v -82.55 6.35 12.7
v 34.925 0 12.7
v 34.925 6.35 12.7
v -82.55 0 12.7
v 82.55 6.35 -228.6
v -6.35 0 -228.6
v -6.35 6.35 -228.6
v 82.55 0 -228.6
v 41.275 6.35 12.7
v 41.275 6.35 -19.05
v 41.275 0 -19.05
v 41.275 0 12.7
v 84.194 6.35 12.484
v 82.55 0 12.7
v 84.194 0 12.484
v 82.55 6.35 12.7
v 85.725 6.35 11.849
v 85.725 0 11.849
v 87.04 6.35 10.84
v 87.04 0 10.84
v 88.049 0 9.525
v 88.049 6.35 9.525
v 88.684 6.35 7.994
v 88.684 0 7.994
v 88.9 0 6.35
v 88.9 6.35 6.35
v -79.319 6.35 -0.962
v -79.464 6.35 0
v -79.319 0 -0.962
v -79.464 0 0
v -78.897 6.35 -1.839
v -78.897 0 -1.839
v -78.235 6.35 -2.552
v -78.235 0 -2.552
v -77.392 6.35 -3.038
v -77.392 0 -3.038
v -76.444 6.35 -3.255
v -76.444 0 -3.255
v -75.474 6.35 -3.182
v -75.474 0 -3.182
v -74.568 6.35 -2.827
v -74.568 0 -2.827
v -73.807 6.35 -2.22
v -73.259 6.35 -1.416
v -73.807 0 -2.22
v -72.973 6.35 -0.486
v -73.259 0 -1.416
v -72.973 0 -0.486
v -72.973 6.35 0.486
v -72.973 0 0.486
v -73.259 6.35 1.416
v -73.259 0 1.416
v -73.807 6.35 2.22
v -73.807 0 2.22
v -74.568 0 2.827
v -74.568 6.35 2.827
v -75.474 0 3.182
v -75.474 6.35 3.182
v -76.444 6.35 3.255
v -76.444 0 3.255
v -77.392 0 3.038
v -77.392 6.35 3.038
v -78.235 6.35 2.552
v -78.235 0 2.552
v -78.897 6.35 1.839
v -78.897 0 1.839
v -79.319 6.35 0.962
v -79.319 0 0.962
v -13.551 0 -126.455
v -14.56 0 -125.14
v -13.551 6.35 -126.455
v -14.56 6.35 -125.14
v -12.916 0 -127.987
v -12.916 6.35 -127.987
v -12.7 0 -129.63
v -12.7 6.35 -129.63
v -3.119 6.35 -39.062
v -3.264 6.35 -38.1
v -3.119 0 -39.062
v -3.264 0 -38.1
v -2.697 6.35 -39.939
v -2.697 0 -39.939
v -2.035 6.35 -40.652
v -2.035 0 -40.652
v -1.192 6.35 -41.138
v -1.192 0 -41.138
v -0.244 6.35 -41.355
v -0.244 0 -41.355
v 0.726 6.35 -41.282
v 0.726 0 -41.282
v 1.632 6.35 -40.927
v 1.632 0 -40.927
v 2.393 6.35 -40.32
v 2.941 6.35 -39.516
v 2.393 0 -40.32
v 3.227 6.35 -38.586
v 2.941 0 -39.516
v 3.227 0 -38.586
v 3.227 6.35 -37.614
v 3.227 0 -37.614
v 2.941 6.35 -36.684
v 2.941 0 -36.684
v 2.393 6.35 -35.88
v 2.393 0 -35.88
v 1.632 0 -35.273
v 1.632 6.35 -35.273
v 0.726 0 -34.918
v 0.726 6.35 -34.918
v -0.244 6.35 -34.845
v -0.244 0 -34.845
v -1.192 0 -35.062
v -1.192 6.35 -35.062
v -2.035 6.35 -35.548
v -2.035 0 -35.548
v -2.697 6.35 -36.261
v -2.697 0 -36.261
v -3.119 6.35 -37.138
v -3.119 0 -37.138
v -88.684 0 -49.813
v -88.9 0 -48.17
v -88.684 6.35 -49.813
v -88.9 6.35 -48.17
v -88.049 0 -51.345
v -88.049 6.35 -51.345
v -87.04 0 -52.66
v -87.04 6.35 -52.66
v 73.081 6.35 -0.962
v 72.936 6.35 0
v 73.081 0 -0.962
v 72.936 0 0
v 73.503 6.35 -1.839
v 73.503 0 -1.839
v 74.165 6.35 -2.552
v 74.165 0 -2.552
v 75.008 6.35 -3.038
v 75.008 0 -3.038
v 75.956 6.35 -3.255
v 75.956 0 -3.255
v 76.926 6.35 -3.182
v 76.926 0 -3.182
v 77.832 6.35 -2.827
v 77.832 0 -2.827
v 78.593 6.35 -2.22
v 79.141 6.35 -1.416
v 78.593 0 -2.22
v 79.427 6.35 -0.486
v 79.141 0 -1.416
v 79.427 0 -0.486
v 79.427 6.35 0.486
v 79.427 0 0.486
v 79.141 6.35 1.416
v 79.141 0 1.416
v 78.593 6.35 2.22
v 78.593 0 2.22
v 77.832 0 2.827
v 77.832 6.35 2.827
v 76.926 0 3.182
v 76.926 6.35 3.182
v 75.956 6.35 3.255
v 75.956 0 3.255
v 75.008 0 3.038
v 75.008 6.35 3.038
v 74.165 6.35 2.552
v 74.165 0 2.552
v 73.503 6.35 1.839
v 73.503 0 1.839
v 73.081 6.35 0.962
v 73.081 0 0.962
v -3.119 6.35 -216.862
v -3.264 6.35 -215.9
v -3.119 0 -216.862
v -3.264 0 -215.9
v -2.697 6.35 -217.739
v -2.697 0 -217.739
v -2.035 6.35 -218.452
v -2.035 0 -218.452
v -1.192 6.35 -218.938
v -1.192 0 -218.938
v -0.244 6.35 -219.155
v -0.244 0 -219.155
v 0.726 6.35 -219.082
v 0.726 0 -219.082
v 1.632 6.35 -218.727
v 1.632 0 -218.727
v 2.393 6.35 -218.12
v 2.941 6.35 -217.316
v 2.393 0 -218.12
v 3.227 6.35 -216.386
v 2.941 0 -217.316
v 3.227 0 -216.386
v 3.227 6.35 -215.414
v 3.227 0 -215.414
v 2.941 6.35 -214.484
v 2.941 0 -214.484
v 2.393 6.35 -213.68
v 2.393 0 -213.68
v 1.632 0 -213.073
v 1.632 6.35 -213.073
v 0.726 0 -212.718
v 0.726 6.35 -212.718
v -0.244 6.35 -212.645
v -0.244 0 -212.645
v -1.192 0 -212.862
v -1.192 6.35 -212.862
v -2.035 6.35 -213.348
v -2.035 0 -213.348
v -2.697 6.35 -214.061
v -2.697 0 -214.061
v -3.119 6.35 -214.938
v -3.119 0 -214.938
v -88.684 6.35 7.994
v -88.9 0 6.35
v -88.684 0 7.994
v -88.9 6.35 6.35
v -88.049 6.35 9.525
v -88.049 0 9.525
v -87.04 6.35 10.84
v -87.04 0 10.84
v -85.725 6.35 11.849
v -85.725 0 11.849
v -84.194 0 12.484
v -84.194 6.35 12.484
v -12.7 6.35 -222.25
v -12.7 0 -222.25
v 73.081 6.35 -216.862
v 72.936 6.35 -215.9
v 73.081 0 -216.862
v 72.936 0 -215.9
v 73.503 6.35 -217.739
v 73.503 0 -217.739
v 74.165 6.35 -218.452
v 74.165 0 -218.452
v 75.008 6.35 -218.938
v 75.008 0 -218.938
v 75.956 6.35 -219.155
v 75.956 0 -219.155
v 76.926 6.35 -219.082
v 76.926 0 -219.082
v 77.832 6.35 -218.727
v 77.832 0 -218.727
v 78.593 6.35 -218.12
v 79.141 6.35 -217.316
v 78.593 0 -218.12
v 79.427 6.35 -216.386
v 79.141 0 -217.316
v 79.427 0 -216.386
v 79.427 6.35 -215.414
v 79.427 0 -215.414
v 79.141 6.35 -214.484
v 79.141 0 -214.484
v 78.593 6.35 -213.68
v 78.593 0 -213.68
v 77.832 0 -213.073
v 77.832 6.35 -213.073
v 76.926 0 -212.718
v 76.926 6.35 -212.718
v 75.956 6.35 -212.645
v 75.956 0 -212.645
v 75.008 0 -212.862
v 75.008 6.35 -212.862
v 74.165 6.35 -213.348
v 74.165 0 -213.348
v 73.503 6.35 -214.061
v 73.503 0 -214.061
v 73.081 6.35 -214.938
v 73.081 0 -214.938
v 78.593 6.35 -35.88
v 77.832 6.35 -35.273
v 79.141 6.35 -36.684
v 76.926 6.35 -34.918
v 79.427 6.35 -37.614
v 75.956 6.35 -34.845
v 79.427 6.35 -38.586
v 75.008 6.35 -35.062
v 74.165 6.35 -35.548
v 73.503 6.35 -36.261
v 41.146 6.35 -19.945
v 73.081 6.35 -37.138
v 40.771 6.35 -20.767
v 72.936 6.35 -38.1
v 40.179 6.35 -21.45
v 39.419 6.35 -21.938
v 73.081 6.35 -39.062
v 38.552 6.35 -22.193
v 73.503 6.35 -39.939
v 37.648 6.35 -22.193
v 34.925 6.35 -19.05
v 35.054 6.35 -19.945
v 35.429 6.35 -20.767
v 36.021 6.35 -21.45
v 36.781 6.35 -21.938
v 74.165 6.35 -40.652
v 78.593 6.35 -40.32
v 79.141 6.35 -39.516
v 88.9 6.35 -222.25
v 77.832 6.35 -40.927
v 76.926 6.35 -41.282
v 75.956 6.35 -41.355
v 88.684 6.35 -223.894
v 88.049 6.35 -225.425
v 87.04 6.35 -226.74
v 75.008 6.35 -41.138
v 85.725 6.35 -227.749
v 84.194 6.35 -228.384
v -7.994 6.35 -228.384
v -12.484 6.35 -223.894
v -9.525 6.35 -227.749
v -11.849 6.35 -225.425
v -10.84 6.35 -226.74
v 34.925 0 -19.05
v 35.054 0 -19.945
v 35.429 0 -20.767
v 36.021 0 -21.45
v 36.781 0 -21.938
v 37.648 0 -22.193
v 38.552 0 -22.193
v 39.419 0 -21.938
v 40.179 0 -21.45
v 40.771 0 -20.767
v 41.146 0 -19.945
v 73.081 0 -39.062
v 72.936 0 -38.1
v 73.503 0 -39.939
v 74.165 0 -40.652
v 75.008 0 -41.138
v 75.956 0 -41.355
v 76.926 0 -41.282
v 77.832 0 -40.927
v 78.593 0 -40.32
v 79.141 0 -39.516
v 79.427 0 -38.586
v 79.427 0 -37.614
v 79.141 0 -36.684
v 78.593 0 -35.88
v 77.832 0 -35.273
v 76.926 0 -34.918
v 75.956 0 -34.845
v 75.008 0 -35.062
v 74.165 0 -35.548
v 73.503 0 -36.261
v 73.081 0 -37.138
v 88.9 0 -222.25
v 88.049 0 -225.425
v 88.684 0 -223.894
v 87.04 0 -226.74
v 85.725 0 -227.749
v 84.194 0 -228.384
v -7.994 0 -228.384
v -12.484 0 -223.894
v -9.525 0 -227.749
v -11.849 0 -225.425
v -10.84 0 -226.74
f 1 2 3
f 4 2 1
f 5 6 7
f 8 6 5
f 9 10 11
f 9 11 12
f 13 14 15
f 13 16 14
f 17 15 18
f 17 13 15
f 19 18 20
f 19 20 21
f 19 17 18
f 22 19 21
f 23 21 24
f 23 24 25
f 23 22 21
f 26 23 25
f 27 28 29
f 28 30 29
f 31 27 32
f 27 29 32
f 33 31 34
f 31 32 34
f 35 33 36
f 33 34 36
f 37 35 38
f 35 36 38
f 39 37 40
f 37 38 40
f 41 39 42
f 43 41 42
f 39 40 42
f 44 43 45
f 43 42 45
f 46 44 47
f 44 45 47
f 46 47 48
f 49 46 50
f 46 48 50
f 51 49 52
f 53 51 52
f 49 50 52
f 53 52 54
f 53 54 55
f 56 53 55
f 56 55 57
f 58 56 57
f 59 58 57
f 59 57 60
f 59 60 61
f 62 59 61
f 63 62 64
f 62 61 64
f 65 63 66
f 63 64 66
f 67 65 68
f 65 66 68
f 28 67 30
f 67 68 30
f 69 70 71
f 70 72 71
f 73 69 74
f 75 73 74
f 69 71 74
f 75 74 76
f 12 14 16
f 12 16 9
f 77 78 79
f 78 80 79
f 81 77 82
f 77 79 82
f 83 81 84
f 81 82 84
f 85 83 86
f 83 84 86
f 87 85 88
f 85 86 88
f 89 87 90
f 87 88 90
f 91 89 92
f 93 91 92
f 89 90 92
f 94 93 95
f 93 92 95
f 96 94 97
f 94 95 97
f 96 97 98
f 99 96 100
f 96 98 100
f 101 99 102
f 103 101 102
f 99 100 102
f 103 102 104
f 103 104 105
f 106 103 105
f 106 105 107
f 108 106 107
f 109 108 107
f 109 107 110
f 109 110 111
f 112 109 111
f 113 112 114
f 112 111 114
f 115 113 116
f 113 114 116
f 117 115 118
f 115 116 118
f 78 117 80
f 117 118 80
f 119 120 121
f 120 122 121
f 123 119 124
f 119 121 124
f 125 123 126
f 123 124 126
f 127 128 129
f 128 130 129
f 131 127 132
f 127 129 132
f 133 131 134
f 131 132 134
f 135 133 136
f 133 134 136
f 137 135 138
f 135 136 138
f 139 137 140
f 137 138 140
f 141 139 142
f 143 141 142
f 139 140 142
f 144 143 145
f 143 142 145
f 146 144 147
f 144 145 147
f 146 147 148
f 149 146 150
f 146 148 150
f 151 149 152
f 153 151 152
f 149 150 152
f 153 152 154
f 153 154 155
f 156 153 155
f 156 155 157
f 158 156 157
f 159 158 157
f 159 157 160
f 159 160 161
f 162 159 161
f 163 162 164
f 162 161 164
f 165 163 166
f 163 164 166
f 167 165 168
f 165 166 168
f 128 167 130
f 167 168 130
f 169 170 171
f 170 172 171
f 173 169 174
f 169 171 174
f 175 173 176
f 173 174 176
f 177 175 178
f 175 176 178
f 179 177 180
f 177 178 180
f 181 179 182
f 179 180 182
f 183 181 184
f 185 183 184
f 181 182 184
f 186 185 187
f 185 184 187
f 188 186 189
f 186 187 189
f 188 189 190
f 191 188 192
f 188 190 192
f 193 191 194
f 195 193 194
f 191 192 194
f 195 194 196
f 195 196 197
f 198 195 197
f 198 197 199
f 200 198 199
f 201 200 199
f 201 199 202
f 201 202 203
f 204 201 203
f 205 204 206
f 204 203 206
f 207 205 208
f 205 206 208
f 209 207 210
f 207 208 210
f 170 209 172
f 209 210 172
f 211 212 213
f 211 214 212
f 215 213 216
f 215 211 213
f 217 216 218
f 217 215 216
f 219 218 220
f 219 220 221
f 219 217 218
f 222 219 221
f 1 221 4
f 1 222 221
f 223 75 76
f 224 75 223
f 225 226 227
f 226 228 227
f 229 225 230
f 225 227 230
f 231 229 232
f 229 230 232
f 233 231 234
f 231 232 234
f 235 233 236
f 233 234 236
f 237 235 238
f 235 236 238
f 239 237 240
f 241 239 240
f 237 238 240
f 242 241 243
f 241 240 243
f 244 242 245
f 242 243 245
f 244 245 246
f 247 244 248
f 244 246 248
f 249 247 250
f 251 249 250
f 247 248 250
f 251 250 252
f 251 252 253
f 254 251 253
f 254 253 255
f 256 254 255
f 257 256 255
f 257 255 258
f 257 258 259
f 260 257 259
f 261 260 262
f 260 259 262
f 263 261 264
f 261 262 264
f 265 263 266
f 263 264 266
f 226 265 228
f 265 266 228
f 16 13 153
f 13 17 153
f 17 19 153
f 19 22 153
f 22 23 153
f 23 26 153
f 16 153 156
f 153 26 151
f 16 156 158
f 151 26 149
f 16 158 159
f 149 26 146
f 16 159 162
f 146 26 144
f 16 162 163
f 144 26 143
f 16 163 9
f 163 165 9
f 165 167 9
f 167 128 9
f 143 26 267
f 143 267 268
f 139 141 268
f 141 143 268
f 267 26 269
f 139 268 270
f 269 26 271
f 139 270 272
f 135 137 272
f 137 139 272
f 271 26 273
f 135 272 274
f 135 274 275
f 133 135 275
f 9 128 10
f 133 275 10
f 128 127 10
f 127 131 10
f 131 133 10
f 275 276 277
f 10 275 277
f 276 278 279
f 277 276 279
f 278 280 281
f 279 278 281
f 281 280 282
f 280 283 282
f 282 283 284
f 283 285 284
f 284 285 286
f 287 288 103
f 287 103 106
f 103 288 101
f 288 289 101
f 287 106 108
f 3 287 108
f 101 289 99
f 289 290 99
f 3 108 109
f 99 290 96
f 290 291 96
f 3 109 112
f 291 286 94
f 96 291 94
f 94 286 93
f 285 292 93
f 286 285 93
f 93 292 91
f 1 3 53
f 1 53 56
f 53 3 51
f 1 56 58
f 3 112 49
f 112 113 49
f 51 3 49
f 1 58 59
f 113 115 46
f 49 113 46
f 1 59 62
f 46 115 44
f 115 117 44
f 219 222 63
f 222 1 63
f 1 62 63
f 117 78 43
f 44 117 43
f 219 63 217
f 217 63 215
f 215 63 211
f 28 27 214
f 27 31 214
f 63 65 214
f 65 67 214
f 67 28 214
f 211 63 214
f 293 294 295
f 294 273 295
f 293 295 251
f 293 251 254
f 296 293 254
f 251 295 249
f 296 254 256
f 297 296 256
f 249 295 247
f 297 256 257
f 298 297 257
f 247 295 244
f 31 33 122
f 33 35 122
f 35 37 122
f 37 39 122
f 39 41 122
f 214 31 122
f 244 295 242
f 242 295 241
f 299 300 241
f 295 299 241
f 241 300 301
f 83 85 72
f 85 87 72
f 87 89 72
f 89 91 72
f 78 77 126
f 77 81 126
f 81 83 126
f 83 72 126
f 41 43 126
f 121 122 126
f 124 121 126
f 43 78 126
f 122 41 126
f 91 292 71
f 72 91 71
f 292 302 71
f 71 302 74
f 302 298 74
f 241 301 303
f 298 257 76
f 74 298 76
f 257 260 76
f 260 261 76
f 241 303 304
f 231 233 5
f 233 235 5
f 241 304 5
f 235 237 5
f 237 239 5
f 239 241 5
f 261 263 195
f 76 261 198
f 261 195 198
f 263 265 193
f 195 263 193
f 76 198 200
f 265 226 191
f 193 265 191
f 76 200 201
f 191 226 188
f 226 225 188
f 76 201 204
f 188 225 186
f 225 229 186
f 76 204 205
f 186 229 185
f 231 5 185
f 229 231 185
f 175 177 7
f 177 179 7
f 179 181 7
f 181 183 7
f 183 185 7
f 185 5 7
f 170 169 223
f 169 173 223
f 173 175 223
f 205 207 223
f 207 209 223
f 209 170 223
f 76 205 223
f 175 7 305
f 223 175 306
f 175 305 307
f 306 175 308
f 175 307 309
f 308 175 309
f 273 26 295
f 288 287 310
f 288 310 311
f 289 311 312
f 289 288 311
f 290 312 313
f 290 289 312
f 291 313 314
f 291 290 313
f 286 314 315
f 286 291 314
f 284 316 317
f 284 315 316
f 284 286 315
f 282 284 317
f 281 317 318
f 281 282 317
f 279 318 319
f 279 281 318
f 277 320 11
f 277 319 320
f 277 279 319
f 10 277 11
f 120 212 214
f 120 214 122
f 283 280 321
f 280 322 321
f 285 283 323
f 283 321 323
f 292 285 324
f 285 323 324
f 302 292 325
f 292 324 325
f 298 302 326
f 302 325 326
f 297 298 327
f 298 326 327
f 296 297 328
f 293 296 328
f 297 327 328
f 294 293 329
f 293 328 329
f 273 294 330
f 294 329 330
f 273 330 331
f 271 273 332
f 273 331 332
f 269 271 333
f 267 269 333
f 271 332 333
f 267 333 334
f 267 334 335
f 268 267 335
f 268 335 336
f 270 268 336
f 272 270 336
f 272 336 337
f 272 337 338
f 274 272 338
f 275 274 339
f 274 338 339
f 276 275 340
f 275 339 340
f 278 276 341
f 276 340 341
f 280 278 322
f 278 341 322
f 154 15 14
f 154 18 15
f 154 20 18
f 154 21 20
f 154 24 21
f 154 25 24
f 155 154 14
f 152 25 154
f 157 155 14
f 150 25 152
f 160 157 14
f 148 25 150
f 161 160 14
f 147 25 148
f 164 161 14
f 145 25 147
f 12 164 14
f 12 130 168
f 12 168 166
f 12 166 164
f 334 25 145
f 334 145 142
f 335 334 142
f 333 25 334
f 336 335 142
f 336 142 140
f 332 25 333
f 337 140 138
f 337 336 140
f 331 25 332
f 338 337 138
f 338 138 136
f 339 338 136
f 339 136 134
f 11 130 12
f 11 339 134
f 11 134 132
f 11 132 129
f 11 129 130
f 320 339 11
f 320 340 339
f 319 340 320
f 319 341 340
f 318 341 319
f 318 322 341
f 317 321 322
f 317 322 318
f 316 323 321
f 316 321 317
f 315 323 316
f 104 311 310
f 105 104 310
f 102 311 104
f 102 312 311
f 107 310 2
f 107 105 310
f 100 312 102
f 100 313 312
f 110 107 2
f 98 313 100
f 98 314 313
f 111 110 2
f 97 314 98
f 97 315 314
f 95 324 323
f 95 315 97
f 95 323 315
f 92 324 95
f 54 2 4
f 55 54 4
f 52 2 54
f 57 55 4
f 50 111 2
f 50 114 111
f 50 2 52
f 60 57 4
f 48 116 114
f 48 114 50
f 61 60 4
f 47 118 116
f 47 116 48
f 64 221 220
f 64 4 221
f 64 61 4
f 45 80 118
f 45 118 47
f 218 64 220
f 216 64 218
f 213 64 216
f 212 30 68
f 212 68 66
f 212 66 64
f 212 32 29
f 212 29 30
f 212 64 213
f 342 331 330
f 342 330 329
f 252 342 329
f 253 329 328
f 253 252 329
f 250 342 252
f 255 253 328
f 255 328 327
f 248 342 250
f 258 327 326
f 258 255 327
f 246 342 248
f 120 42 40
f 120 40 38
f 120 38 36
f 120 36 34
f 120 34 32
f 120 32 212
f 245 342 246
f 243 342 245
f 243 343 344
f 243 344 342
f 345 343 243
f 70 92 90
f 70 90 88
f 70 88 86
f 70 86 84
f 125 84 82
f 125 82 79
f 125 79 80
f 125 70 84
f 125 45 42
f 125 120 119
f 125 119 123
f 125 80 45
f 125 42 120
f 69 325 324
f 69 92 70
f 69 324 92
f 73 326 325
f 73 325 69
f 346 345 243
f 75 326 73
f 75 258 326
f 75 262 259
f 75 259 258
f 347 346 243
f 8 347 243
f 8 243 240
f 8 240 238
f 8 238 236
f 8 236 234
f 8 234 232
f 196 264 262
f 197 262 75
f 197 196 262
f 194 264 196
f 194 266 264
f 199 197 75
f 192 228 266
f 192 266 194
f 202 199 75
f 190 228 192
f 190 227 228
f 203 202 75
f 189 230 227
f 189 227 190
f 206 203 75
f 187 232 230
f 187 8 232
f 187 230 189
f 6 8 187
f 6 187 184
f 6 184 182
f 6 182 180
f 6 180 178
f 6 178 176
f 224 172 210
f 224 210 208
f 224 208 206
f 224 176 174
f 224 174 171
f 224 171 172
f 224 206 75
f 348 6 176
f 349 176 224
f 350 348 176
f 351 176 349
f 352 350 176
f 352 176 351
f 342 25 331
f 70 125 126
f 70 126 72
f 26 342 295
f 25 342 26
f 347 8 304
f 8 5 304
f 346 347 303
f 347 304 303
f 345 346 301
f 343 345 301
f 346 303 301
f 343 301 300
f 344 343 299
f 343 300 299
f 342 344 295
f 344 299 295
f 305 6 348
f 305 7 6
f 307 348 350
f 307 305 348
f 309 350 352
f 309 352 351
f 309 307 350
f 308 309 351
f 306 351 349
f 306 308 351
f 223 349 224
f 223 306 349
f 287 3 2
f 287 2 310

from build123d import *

# Parameters (mm, degrees)
BOSS_EXTRUDE1_DEPTH         = 6.35
F_1_4_CLEARANCE_HOLE1_D     = 6.5278
F_1_4_CLEARANCE_HOLE1_DEPTH = 6.35
F_1_4_CLEARANCE_HOLE1_TIP   = 1.961148974
FILLET1_R                   = 6.35
CUT_EXTRUDE1_REACH          = 8.35


with BuildPart() as part:
    # Sketch1 → Boss-Extrude1 (new body)
    with BuildSketch(Plane(origin=(0, 0, 0), x_dir=(1, 0, 0), z_dir=(0, 1, 0))):
        Polygon((-12.7, 228.6), (88.9, 228.6), (88.9, -12.7), (-88.9, -12.7), (-88.9, 50.8), (-12.7, 127), align=None)
    extrude(amount=BOSS_EXTRUDE1_DEPTH)

    # 1/4 Clearance Hole1
    with Locations(Plane(origin=(0, 6.35, 0), x_dir=(1, 0, 0), z_dir=(0, 1, 0))):
        with Locations((76.2, 215.9), (0, 215.9), (0, 38.1), (76.2, 38.1), (76.2, 0), (-76.2, 0)):
            Hole(F_1_4_CLEARANCE_HOLE1_D / 2, depth=F_1_4_CLEARANCE_HOLE1_DEPTH)
            with Locations((0, 0, -(F_1_4_CLEARANCE_HOLE1_DEPTH + F_1_4_CLEARANCE_HOLE1_TIP / 2))):  # 118° drill point
                Cone(0, F_1_4_CLEARANCE_HOLE1_D / 2, F_1_4_CLEARANCE_HOLE1_TIP, mode=Mode.SUBTRACT)

    # Fillet1
    fillet1_edges = [part.edges().sort_by_distance(p)[0] for p in [
        (-12.7, 3.175, -228.6),
        (88.9, 3.175, -228.6),
        (88.9, 3.175, 12.7),
        (-88.9, 3.175, 12.7),
        (-88.9, 3.175, -50.8),
        (-12.7, 3.175, -127),
    ]]
    fillet(fillet1_edges, radius=FILLET1_R)

    # Sketch4 → Cut-Extrude1 (cut, up to next)
    with BuildSketch(Plane(origin=(0, 6.35, 0), x_dir=(1, 0, 0), z_dir=(0, 1, 0)), mode=Mode.PRIVATE) as cut_extrude1_sk1:
        with BuildLine():
            Line((41.275, 19.05), (41.275, -12.7))
            ThreePointArc((41.275, -12.7), (38.1, -15.875), (34.925, -12.7))
            Line((34.925, -12.7), (34.925, 19.05))
            ThreePointArc((34.925, 19.05), (38.1, 22.225), (41.275, 19.05))
        make_face()
    cut_extrude1_tool1 = extrude(cut_extrude1_sk1.sketch, amount=-CUT_EXTRUDE1_REACH, mode=Mode.PRIVATE) & part.part
    add(cut_extrude1_tool1.solids().sort_by_distance((38.1, 6.35, -3.175))[0], mode=Mode.SUBTRACT)


solid = part.part
